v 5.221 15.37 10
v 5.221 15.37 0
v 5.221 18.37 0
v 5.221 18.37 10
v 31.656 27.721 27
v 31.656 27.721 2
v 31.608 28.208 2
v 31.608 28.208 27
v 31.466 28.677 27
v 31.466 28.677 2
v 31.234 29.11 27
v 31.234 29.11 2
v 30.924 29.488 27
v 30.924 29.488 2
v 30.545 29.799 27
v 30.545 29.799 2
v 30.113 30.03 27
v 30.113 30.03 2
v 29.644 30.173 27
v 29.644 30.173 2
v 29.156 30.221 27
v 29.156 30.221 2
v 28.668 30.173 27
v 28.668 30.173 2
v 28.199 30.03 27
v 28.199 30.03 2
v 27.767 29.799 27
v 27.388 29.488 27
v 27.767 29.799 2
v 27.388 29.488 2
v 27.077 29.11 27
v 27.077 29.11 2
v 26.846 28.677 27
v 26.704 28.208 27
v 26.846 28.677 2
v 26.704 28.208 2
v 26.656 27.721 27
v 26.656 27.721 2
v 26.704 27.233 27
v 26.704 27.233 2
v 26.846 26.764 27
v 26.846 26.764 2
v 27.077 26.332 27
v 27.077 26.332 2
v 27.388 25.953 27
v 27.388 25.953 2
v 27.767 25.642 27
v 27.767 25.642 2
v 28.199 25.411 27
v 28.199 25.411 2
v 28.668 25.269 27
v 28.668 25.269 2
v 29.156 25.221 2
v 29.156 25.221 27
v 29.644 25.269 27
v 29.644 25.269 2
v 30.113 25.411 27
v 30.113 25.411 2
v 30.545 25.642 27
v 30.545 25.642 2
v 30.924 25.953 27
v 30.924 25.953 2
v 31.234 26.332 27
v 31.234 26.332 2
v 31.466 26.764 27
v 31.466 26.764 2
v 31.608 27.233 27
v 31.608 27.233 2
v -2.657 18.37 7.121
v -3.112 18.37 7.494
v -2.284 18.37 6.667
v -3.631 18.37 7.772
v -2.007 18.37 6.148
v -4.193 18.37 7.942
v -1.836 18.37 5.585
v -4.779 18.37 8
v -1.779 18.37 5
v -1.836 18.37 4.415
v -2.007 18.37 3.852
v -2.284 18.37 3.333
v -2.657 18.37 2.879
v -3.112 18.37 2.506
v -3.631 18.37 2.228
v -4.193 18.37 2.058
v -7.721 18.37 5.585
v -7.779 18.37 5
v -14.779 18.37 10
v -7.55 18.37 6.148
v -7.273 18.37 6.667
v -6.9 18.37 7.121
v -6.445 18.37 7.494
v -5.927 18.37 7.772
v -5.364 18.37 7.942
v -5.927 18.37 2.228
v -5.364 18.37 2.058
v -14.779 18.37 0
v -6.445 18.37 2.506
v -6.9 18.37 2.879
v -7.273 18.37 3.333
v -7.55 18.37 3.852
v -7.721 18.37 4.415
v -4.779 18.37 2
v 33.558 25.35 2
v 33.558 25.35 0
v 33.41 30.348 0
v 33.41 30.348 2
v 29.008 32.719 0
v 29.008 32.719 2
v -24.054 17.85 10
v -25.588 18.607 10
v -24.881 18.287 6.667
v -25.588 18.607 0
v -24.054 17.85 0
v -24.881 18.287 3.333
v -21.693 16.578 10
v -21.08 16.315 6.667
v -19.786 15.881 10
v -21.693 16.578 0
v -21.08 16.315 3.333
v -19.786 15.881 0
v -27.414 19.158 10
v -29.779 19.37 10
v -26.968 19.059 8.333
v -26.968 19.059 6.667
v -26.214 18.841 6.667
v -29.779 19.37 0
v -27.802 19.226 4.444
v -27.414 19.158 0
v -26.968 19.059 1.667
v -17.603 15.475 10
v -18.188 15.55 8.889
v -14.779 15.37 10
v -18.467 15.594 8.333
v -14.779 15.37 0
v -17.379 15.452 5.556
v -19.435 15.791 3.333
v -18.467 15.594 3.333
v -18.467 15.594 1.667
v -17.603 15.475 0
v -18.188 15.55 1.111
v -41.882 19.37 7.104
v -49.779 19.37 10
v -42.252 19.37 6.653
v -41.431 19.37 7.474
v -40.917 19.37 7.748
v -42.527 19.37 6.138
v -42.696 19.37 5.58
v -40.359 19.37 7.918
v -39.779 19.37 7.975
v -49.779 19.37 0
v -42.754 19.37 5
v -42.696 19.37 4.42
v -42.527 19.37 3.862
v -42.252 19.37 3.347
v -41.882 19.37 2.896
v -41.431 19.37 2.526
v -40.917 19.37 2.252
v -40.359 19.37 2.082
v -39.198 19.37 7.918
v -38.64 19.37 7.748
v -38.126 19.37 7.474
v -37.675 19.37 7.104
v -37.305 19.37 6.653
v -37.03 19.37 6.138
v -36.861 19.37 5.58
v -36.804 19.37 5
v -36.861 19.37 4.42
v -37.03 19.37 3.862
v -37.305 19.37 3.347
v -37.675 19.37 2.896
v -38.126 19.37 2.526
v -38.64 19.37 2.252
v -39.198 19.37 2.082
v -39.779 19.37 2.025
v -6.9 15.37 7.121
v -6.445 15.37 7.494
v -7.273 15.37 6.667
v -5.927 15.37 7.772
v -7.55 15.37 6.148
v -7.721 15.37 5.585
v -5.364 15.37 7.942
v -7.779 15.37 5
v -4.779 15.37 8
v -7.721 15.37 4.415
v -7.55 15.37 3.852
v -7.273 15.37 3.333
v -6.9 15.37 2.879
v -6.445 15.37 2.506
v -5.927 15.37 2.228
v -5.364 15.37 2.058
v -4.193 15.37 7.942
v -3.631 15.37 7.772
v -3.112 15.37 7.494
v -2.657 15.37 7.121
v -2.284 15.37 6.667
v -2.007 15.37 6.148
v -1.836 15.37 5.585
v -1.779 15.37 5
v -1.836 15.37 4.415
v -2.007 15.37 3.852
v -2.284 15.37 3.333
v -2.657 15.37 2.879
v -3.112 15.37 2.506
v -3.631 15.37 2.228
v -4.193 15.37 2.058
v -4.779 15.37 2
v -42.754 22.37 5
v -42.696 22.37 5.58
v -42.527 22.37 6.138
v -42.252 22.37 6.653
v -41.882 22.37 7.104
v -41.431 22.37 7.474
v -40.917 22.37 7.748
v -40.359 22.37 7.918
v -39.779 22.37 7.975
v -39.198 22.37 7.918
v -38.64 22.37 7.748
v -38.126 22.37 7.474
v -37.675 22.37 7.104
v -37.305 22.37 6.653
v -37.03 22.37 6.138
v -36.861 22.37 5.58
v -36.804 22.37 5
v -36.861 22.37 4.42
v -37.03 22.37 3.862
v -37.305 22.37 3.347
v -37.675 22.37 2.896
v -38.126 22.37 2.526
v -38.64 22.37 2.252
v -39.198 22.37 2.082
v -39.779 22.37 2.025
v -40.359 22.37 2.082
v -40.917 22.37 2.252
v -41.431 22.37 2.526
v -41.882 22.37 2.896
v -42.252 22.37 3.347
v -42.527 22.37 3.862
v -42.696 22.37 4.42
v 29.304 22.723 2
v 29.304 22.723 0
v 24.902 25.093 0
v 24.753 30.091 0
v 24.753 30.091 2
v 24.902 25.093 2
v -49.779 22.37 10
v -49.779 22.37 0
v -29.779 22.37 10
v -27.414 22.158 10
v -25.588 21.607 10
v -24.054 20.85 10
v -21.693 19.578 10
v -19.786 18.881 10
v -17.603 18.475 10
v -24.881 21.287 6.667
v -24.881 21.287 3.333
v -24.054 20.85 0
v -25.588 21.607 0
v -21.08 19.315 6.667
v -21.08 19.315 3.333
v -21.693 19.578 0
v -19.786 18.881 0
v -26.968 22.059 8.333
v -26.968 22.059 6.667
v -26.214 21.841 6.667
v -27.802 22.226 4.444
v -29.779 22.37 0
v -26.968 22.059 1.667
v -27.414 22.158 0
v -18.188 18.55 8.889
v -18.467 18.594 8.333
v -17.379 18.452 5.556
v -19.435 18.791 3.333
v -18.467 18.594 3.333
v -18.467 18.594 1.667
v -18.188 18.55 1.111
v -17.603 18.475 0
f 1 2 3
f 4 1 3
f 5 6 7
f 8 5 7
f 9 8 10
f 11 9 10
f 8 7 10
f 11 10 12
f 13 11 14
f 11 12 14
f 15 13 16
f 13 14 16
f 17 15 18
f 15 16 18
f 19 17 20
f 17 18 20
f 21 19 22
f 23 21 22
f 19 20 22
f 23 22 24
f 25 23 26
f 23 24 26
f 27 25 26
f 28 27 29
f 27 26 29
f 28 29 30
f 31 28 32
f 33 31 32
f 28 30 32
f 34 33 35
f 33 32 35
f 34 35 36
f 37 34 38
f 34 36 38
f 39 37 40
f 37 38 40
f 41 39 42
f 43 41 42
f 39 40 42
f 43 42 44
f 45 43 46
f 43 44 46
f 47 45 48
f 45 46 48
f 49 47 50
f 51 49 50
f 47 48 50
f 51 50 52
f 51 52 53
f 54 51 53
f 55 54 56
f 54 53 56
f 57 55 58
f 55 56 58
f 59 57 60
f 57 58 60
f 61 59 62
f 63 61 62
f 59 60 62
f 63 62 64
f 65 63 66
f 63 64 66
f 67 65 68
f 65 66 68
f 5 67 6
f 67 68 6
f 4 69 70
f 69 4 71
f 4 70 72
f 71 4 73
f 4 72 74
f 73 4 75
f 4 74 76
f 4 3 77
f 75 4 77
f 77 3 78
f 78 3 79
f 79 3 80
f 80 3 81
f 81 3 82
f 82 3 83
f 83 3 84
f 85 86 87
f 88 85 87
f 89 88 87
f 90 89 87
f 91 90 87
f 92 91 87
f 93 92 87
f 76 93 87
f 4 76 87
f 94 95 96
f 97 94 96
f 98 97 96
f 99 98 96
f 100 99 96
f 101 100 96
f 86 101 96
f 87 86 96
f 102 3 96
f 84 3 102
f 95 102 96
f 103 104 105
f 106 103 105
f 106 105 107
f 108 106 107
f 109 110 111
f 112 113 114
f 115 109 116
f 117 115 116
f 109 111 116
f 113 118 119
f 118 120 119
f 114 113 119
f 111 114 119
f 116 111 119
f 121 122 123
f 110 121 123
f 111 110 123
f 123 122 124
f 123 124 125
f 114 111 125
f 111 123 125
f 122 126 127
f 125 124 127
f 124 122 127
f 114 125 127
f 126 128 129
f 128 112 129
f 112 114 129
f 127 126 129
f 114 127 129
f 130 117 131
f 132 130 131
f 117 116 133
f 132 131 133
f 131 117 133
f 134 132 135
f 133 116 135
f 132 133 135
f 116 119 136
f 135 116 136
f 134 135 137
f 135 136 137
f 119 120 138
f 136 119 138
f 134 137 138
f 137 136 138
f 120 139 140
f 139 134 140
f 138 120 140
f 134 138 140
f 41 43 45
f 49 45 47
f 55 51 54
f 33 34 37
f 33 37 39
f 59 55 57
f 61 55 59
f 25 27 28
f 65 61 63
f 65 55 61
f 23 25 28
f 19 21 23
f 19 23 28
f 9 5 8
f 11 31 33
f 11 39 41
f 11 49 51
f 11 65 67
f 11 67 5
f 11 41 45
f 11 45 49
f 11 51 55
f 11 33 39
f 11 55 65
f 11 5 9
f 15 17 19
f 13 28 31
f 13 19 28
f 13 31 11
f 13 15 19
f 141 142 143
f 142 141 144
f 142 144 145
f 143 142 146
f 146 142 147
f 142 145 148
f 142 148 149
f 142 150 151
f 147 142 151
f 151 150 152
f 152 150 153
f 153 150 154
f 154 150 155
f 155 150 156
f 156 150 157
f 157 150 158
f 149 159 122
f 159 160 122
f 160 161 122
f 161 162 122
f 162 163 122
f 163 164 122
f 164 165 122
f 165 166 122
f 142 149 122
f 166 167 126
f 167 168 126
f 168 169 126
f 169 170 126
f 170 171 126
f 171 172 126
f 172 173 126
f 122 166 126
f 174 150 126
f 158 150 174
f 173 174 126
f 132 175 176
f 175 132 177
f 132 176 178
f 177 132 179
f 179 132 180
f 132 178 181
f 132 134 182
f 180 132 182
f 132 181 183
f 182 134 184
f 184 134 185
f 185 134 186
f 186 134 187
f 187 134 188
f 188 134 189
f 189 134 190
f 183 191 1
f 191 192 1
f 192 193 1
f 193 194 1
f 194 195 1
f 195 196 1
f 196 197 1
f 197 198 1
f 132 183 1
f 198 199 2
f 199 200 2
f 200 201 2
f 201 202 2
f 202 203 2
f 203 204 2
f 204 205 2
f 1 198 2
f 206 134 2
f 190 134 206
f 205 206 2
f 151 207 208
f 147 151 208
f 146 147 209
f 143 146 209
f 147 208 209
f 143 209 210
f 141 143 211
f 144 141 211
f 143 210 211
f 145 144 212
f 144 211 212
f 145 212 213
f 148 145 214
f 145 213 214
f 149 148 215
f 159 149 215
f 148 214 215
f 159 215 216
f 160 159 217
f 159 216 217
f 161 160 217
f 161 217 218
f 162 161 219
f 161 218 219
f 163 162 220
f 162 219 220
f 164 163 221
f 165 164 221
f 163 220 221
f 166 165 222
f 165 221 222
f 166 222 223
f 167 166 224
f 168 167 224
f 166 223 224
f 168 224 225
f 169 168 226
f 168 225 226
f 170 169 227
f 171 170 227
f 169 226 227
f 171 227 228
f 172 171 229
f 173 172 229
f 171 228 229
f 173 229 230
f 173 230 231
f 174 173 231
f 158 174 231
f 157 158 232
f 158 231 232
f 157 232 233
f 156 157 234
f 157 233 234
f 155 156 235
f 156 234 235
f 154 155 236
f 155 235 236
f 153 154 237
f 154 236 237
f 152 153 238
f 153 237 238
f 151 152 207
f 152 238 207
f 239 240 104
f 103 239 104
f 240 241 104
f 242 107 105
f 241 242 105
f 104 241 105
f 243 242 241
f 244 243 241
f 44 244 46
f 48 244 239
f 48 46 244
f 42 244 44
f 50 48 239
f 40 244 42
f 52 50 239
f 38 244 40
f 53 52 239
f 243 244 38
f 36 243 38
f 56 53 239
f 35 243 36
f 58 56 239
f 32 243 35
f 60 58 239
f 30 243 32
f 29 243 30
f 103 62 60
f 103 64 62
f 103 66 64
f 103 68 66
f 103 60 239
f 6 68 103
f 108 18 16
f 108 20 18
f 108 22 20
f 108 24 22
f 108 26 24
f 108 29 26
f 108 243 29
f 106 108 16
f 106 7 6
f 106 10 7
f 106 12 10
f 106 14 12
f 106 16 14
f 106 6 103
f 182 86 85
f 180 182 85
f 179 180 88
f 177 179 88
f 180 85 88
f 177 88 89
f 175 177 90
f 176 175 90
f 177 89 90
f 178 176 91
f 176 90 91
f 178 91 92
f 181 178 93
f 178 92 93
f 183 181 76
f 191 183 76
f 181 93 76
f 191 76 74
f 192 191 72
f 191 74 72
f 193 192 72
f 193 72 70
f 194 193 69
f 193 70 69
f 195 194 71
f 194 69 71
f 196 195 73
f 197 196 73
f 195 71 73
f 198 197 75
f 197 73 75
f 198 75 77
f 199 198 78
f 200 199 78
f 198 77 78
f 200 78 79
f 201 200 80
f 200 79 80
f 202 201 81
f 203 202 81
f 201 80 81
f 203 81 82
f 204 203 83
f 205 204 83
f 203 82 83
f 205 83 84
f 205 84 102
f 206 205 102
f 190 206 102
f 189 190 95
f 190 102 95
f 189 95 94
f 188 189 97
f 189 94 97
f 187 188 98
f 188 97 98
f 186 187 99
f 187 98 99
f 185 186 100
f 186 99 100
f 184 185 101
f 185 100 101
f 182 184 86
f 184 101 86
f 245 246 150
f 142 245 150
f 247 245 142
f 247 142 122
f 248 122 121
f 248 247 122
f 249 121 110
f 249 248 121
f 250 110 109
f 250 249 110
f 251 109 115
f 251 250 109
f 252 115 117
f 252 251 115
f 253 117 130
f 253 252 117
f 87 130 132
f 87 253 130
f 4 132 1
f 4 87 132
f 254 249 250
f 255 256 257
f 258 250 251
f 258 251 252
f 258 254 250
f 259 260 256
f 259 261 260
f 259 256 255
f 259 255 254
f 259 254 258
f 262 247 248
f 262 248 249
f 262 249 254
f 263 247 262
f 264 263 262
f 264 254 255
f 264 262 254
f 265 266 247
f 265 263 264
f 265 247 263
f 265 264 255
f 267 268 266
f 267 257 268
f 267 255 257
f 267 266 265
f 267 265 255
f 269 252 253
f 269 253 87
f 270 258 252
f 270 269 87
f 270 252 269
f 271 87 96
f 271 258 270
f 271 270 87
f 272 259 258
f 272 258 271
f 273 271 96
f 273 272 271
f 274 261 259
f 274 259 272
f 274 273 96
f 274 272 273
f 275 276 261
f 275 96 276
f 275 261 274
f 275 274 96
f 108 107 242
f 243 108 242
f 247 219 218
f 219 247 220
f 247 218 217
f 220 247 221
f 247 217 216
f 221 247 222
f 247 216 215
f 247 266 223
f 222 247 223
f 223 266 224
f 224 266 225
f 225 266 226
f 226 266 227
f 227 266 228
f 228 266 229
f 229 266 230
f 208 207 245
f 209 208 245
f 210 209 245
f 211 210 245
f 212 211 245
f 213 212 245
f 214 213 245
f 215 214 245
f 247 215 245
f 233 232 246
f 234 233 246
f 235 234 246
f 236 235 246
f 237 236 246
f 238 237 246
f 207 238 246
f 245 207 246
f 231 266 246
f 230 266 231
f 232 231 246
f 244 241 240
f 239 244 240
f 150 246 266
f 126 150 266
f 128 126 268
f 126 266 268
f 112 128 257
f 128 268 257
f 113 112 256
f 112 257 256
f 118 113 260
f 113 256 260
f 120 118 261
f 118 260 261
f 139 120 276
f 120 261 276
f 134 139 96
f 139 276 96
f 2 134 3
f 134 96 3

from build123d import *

# Parameters (mm, degrees)
F1_DEPTH = 10
F2_R     = 2.974937
F3_DEPTH = 3
F4_R     = 3
F5_DEPTH = 3
F7_DEPTH = 2
F8_R     = 2.5
F9_DEPTH = 25


with BuildPart() as f1:
    # F0 (on Top) → F1 (new body)
    with BuildSketch(Plane.XY):
        with BuildLine():
            Line((-29.778655, 22.370057), (-49.778655, 22.370057))
            Line((-49.778655, 22.370057), (-49.778655, 19.370057))
            Line((-49.778655, 19.370057), (-29.778655, 19.370057))
            add(Edge.make_bspline(
                [(-29.778655, 19.370057), (-23.134362, 19.370057), (-23.529627, 15.161893), (-14.778655, 15.370057)],
                knots=[0, 0, 0, 0, 15.524175, 15.524175, 15.524175, 15.524175], degree=3))
            Line((-14.778655, 15.370057), (5.221345, 15.370057))
            Line((5.221345, 15.370057), (5.221345, 18.370057))
            Line((5.221345, 18.370057), (-14.778655, 18.370057))
            add(Edge.make_bspline(
                [(-29.778655, 22.370057), (-23.134362, 22.370057), (-23.529627, 18.161893), (-14.778655, 18.370057)],
                knots=[0, 0, 0, 0, 15.524175, 15.524175, 15.524175, 15.524175], degree=3))
        make_face()
    extrude(amount=F1_DEPTH)

    # F2 (on face) → F3 (cut, through all)
    with BuildSketch(Plane(origin=(0, 22.370057, 0), x_dir=(-1, 0, 0), z_dir=(0, 1, 0))):
        with Locations((39.778655, 5)):
            Circle(F2_R)
    extrude(amount=-F3_DEPTH, mode=Mode.SUBTRACT)

    # F4 (on face) → F5 (cut, through all)
    with BuildSketch(Plane(origin=(0, 18.370057, 0), x_dir=(-1, 0, 0), z_dir=(0, 1, 0))):
        with Locations((4.778655, 5)):
            Circle(F4_R)
    extrude(amount=-F5_DEPTH, mode=Mode.SUBTRACT)


with BuildPart() as f7:
    # F6 (on Top) → F7 (new body)
    with BuildSketch(Plane.XY):
        Polygon((29.007556, 32.718519), (24.753465, 30.091217), (24.90173, 25.093416), (29.304085, 22.722916), (33.558176, 25.350218), (33.409911, 30.348019), align=None)
    extrude(amount=F7_DEPTH)

    # F8 (on face) → F9 (join)
    with BuildSketch(Plane.XY.offset(2)):
        with Locations((29.155821, 27.720718)):
            Circle(F8_R)
    extrude(amount=F9_DEPTH)


solid = Compound([f1.part, f7.part])
